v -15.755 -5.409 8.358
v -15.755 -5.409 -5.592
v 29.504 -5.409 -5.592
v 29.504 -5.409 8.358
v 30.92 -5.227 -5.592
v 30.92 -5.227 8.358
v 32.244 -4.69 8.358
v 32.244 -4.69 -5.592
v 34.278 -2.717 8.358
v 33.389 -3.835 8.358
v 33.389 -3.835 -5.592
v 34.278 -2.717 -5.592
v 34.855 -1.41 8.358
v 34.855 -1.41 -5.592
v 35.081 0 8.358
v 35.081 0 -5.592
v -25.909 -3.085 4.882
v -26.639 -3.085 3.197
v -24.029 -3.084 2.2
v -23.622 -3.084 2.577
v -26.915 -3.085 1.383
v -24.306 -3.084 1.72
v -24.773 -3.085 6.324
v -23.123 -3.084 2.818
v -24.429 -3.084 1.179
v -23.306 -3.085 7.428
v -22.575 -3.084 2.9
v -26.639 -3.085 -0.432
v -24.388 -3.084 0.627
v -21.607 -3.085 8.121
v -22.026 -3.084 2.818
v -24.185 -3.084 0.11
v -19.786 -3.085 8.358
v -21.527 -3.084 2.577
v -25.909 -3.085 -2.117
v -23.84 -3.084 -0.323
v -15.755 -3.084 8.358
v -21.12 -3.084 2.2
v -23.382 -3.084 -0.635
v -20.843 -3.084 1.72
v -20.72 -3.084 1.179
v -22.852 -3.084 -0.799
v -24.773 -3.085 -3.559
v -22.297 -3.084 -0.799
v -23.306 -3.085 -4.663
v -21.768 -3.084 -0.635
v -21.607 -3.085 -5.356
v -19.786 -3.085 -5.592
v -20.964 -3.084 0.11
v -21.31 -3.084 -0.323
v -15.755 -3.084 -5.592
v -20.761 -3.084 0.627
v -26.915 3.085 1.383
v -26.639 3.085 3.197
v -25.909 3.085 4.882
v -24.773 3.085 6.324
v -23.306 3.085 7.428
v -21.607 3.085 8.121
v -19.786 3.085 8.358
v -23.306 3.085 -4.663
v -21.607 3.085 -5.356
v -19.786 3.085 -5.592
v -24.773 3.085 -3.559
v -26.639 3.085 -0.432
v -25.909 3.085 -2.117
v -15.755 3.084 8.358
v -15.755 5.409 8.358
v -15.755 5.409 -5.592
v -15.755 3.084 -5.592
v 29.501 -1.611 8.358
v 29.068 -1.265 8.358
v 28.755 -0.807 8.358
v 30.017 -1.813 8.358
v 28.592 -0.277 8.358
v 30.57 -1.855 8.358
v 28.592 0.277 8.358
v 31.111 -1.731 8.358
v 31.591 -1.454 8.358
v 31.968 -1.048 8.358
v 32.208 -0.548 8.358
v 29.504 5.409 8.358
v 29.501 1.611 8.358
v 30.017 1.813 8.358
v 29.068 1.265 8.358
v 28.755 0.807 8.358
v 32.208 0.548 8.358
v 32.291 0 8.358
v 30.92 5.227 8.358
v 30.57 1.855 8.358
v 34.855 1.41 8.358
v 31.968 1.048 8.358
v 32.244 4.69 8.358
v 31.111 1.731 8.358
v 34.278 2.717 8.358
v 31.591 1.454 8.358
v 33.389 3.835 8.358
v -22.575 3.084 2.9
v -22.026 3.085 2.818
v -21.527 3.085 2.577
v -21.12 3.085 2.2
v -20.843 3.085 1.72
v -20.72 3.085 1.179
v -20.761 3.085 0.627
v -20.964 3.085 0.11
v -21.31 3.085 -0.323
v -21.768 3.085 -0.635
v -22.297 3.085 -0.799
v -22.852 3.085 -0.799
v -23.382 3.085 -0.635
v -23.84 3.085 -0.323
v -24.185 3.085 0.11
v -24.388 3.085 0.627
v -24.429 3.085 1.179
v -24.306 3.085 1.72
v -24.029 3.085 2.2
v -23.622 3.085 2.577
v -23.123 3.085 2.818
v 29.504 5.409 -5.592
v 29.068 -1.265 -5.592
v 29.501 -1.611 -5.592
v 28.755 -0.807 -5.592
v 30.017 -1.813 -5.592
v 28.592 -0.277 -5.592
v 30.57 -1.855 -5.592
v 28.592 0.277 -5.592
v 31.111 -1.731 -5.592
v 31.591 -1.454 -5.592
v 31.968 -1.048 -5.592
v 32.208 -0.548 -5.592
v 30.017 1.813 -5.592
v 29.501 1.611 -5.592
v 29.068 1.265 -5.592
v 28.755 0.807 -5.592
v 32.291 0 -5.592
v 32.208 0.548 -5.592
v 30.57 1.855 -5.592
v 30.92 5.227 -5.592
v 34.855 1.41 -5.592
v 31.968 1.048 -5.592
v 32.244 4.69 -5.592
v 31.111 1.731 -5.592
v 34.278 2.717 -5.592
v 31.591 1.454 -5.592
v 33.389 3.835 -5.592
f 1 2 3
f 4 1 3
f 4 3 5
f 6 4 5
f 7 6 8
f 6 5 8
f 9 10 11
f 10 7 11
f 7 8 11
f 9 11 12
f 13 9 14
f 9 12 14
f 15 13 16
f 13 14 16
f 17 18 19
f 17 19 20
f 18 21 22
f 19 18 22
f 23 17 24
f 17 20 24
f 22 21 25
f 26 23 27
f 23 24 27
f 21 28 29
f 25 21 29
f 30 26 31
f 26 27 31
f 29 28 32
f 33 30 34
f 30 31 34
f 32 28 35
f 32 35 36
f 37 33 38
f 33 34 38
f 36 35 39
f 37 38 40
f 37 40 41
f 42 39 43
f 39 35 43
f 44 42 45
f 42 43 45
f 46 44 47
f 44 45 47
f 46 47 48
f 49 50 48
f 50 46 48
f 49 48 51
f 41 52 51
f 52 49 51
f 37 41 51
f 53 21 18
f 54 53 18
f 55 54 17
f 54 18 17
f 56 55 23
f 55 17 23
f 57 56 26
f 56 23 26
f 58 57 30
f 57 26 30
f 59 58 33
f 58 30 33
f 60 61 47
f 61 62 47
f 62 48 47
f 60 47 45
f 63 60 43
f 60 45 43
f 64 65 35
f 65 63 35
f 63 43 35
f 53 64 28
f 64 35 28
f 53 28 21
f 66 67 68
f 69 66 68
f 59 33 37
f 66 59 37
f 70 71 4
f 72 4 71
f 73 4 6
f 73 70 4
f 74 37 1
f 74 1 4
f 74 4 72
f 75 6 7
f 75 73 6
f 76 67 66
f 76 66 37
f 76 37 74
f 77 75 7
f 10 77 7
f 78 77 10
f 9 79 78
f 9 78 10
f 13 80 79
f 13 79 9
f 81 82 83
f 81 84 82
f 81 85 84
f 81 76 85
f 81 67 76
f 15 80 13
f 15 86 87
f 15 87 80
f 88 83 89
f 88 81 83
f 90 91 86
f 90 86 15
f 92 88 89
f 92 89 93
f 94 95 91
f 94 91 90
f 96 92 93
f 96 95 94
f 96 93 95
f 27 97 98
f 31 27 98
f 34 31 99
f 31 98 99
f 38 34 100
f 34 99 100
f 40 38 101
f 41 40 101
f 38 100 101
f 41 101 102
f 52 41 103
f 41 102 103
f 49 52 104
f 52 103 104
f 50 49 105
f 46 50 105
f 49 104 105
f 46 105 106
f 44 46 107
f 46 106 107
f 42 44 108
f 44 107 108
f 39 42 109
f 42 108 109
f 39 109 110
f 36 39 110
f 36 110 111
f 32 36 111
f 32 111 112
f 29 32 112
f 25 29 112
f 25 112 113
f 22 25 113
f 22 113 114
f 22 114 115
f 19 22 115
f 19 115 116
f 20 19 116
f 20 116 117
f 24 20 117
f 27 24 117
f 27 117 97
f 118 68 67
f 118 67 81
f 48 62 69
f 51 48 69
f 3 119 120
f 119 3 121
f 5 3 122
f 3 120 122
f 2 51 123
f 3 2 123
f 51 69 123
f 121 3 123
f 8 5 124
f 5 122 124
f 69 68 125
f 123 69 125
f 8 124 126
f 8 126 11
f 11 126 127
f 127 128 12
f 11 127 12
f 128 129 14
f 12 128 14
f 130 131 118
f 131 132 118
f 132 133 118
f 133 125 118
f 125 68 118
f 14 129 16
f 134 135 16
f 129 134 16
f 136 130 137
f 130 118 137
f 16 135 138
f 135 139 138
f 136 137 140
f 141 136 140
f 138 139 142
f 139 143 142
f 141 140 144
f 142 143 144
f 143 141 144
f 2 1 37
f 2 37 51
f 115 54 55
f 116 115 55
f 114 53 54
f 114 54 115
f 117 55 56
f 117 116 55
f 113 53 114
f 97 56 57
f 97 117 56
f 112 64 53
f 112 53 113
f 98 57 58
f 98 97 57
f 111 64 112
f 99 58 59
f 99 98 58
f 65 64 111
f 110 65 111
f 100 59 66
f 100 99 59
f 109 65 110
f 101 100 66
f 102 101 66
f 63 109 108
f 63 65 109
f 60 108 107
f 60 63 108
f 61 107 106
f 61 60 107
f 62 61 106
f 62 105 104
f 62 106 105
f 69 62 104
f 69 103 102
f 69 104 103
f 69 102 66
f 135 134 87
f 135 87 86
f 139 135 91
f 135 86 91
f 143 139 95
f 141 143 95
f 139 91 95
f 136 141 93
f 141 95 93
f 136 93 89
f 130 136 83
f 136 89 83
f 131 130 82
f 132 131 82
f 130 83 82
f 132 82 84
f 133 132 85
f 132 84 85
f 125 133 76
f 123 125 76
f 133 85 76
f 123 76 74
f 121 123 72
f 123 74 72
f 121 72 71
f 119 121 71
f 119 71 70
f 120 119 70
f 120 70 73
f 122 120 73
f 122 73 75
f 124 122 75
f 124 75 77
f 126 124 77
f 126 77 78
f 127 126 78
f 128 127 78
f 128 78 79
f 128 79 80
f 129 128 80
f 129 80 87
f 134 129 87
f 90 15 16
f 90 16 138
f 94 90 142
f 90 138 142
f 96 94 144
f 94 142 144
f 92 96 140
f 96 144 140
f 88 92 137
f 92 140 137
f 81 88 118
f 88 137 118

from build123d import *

# Parameters (mm, degrees)
SKETCH1_W           = 200
SKETCH1_H           = 45
BOSS_EXTRUDE1_DEPTH = 17.45
FILLET1_R           = 18
FILLET2_R           = 23
SKETCH2_W           = 40
SKETCH2_H           = 45
CUT_EXTRUDE1_DEPTH  = 7.5
SKETCH3_R           = 6
CUT_EXTRUDE2_DEPTH  = 120.515065654
SKETCH4_R           = 6
CUT_EXTRUDE3_DEPTH  = 124.027462877
SCALE1_SCALE        = 0.31


with BuildPart() as part:
    # Sketch1 → Boss-Extrude1 (new, symmetric)
    with BuildSketch(Plane(origin=(0, 0, 0), x_dir=(1, 0, 0), z_dir=(0, 1, 0))):
        with Locations((13.173125929, -4.459910913)):
            Rectangle(SKETCH1_W, SKETCH1_H)
    extrude(amount=BOSS_EXTRUDE1_DEPTH, both=True)

    # Fillet1
    # the kernel refuses this fillet: 18 mm, written as the material it takes off along each edge
    with BuildSketch(Plane(origin=(113.173125929, -17.45, -63.040089087), x_dir=(0, 1, 0), z_dir=(0, 0, 1)), Plane(origin=(113.173125929, 17.45, -63.040089087), x_dir=(-1, 0, 0), z_dir=(0, 0, 1))) as fillet1_piece_1:
        with BuildLine():
            CenterArc((FILLET1_R, FILLET1_R), FILLET1_R, 180, 90)
            Line((0, FILLET1_R), (0, 0))
            Line((0, 0), (FILLET1_R, 0))
        make_face()
    extrude(amount=135, mode=Mode.SUBTRACT)

    # Fillet2
    # the kernel refuses this fillet: 23 mm, written as the material it takes off along each edge
    with BuildSketch(Plane(origin=(-86.826874071, -74.95, -18.040089087), x_dir=(1, 0, 0), z_dir=(0, 1, 0)), Plane(origin=(-86.826874071, -74.95, 26.959910913), x_dir=(0, 0, -1), z_dir=(0, 1, 0))) as fillet2_piece_1:
        with BuildLine():
            CenterArc((FILLET2_R, -FILLET2_R), FILLET2_R, 90, 90)
            Line((0, -FILLET2_R), (0, 0))
            Line((0, 0), (FILLET2_R, 0))
        make_face()
    extrude(amount=149.9, mode=Mode.SUBTRACT)

    # Sketch2 → Cut-Extrude1 (cut)
    with BuildSketch(Plane(origin=(0, 17.45, 0), x_dir=(1, 0, 0), z_dir=(0, 1, 0))):
        with Locations((-70.821438646, -4.459910913)):
            Rectangle(SKETCH2_W, SKETCH2_H)
    cut_extrude1 = extrude(amount=-CUT_EXTRUDE1_DEPTH, mode=Mode.SUBTRACT)

    # Mirror1: Cut-Extrude1 across plane
    add(cut_extrude1.mirror(Plane.ZX), mode=Mode.SUBTRACT)

    # Sketch3 → Cut-Extrude2 (cut, through all)
    with BuildSketch(Plane(origin=(0, 9.95, 0), x_dir=(1, 0, 0), z_dir=(0, 1, 0))):
        with Locations(Location((-72.821438646, -3.356394194, 0), (0, 0, 270))):
            Circle(SKETCH3_R)
    extrude(amount=-CUT_EXTRUDE2_DEPTH, mode=Mode.SUBTRACT)

    # Sketch4 → Cut-Extrude3 (cut, through all)
    with BuildSketch(Plane.XY.offset(26.959910913)):
        with Locations((98.164721189, 0)):
            Circle(SKETCH4_R)
    extrude(amount=-CUT_EXTRUDE3_DEPTH, mode=Mode.SUBTRACT)


with BuildPart() as part_1:
    # Scale1: scaled about (0, 0, 0)
    add(part.part.scale(SCALE1_SCALE))


solid = part_1.part
